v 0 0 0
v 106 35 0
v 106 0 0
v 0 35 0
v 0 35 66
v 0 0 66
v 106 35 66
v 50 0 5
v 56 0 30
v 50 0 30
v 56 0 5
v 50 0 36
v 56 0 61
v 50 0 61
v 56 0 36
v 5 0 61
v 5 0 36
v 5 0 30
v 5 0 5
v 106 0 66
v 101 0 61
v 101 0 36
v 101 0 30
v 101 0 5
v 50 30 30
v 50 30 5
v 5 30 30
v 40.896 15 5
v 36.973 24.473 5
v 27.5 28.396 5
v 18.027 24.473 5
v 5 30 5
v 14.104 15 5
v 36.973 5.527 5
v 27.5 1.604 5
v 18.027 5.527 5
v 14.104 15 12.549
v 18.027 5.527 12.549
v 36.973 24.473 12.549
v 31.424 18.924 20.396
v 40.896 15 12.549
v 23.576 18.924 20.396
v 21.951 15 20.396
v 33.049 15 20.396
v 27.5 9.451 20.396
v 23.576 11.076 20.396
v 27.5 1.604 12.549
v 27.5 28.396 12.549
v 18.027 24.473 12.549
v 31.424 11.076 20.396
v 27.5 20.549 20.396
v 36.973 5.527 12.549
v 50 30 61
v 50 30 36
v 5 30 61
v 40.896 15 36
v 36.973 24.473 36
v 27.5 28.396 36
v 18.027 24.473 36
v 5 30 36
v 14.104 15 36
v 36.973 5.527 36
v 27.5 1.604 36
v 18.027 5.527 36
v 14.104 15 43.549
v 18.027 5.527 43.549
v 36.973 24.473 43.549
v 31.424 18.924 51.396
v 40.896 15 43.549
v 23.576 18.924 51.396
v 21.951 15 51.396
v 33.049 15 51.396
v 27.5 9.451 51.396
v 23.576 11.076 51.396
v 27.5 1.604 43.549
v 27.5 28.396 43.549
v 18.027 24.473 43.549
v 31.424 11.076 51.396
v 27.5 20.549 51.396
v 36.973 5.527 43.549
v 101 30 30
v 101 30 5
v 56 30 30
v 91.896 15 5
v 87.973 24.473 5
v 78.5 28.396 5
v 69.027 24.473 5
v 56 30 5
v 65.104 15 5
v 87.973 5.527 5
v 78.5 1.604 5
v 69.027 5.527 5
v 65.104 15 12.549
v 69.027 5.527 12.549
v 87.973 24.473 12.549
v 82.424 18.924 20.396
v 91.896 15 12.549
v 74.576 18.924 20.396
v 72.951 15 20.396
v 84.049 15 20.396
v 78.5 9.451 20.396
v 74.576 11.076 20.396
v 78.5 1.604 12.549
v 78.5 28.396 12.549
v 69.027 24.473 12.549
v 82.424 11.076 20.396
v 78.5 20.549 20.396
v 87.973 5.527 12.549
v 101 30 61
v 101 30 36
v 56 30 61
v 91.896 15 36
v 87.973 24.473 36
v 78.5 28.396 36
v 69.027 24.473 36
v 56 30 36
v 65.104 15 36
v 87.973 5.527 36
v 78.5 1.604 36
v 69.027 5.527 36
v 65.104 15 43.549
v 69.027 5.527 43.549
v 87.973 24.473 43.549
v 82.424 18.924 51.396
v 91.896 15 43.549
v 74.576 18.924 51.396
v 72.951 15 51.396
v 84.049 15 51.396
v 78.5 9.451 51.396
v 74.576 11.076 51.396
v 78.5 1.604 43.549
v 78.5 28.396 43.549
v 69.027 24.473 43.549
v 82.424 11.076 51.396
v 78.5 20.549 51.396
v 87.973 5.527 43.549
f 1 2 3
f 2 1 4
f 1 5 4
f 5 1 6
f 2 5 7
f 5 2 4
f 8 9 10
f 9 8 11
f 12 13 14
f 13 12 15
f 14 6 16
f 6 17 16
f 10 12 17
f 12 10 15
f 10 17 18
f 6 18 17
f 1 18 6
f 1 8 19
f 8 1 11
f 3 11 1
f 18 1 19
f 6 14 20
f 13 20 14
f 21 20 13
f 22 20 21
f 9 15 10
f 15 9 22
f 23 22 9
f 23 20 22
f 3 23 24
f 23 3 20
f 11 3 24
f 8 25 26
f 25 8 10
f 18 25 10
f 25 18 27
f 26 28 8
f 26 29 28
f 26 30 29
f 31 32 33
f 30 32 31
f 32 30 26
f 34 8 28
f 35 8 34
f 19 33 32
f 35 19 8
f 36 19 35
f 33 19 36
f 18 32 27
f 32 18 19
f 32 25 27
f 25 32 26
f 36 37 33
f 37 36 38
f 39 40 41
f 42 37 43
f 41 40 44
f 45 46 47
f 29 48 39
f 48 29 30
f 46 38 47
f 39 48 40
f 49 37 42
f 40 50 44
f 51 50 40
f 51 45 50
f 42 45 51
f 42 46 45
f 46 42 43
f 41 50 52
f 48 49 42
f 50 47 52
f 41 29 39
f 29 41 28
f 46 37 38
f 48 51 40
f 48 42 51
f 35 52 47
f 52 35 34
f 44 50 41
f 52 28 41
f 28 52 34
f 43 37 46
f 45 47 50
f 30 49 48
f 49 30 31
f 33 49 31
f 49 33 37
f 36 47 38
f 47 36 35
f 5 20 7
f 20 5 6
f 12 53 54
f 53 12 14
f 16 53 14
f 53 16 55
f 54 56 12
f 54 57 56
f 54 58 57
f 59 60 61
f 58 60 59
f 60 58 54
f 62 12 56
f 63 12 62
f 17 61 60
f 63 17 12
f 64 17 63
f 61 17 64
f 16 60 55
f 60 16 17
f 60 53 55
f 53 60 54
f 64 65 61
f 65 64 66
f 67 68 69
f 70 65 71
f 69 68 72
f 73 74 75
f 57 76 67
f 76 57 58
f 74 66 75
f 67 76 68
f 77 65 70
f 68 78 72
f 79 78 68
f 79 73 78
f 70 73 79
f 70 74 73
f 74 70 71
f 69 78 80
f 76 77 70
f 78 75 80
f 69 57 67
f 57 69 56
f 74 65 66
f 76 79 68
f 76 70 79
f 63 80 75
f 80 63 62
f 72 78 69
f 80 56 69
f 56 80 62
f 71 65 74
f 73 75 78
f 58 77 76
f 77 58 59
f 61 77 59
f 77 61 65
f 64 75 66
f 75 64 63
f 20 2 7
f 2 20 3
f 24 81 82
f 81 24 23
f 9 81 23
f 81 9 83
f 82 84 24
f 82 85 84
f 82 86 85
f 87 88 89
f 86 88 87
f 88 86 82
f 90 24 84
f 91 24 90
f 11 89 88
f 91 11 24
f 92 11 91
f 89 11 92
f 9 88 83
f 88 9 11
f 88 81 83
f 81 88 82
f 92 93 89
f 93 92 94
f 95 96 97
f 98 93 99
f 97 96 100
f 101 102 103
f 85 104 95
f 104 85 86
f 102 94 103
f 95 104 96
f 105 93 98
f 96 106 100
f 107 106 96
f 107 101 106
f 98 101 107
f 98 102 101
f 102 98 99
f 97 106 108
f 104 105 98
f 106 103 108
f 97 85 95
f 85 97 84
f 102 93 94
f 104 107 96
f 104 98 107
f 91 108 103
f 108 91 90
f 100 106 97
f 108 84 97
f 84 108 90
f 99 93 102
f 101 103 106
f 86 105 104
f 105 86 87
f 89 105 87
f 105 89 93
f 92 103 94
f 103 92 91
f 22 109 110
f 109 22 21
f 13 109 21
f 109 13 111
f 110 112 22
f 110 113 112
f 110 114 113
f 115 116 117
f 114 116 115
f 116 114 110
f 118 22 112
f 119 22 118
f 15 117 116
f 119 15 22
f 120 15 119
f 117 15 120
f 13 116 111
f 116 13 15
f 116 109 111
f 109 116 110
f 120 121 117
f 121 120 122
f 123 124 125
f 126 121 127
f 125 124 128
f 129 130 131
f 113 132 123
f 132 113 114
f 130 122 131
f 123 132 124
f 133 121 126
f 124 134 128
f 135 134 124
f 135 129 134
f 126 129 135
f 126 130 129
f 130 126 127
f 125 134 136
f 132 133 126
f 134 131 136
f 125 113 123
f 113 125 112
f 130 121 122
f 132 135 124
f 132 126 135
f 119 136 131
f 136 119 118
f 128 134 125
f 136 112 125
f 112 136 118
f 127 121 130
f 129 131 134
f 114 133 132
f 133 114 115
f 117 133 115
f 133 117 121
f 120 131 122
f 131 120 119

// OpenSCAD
for (x = [0:1]) {
  for (y = [0:1]) {
    translate ([(x*51),0,(y*31)]) {
      difference () {
        cube ([55,35,35]);
        translate ([5,-1,5]) {
          cube ([45,31,25]);
        }
      }
      translate ([27.5,15,7]) {
        difference () {
          sphere (d=29, $fn=8);
          translate([0,0,-20]) {
            cube (32,center=true);
          }
        }
      }
    }
  }
}
